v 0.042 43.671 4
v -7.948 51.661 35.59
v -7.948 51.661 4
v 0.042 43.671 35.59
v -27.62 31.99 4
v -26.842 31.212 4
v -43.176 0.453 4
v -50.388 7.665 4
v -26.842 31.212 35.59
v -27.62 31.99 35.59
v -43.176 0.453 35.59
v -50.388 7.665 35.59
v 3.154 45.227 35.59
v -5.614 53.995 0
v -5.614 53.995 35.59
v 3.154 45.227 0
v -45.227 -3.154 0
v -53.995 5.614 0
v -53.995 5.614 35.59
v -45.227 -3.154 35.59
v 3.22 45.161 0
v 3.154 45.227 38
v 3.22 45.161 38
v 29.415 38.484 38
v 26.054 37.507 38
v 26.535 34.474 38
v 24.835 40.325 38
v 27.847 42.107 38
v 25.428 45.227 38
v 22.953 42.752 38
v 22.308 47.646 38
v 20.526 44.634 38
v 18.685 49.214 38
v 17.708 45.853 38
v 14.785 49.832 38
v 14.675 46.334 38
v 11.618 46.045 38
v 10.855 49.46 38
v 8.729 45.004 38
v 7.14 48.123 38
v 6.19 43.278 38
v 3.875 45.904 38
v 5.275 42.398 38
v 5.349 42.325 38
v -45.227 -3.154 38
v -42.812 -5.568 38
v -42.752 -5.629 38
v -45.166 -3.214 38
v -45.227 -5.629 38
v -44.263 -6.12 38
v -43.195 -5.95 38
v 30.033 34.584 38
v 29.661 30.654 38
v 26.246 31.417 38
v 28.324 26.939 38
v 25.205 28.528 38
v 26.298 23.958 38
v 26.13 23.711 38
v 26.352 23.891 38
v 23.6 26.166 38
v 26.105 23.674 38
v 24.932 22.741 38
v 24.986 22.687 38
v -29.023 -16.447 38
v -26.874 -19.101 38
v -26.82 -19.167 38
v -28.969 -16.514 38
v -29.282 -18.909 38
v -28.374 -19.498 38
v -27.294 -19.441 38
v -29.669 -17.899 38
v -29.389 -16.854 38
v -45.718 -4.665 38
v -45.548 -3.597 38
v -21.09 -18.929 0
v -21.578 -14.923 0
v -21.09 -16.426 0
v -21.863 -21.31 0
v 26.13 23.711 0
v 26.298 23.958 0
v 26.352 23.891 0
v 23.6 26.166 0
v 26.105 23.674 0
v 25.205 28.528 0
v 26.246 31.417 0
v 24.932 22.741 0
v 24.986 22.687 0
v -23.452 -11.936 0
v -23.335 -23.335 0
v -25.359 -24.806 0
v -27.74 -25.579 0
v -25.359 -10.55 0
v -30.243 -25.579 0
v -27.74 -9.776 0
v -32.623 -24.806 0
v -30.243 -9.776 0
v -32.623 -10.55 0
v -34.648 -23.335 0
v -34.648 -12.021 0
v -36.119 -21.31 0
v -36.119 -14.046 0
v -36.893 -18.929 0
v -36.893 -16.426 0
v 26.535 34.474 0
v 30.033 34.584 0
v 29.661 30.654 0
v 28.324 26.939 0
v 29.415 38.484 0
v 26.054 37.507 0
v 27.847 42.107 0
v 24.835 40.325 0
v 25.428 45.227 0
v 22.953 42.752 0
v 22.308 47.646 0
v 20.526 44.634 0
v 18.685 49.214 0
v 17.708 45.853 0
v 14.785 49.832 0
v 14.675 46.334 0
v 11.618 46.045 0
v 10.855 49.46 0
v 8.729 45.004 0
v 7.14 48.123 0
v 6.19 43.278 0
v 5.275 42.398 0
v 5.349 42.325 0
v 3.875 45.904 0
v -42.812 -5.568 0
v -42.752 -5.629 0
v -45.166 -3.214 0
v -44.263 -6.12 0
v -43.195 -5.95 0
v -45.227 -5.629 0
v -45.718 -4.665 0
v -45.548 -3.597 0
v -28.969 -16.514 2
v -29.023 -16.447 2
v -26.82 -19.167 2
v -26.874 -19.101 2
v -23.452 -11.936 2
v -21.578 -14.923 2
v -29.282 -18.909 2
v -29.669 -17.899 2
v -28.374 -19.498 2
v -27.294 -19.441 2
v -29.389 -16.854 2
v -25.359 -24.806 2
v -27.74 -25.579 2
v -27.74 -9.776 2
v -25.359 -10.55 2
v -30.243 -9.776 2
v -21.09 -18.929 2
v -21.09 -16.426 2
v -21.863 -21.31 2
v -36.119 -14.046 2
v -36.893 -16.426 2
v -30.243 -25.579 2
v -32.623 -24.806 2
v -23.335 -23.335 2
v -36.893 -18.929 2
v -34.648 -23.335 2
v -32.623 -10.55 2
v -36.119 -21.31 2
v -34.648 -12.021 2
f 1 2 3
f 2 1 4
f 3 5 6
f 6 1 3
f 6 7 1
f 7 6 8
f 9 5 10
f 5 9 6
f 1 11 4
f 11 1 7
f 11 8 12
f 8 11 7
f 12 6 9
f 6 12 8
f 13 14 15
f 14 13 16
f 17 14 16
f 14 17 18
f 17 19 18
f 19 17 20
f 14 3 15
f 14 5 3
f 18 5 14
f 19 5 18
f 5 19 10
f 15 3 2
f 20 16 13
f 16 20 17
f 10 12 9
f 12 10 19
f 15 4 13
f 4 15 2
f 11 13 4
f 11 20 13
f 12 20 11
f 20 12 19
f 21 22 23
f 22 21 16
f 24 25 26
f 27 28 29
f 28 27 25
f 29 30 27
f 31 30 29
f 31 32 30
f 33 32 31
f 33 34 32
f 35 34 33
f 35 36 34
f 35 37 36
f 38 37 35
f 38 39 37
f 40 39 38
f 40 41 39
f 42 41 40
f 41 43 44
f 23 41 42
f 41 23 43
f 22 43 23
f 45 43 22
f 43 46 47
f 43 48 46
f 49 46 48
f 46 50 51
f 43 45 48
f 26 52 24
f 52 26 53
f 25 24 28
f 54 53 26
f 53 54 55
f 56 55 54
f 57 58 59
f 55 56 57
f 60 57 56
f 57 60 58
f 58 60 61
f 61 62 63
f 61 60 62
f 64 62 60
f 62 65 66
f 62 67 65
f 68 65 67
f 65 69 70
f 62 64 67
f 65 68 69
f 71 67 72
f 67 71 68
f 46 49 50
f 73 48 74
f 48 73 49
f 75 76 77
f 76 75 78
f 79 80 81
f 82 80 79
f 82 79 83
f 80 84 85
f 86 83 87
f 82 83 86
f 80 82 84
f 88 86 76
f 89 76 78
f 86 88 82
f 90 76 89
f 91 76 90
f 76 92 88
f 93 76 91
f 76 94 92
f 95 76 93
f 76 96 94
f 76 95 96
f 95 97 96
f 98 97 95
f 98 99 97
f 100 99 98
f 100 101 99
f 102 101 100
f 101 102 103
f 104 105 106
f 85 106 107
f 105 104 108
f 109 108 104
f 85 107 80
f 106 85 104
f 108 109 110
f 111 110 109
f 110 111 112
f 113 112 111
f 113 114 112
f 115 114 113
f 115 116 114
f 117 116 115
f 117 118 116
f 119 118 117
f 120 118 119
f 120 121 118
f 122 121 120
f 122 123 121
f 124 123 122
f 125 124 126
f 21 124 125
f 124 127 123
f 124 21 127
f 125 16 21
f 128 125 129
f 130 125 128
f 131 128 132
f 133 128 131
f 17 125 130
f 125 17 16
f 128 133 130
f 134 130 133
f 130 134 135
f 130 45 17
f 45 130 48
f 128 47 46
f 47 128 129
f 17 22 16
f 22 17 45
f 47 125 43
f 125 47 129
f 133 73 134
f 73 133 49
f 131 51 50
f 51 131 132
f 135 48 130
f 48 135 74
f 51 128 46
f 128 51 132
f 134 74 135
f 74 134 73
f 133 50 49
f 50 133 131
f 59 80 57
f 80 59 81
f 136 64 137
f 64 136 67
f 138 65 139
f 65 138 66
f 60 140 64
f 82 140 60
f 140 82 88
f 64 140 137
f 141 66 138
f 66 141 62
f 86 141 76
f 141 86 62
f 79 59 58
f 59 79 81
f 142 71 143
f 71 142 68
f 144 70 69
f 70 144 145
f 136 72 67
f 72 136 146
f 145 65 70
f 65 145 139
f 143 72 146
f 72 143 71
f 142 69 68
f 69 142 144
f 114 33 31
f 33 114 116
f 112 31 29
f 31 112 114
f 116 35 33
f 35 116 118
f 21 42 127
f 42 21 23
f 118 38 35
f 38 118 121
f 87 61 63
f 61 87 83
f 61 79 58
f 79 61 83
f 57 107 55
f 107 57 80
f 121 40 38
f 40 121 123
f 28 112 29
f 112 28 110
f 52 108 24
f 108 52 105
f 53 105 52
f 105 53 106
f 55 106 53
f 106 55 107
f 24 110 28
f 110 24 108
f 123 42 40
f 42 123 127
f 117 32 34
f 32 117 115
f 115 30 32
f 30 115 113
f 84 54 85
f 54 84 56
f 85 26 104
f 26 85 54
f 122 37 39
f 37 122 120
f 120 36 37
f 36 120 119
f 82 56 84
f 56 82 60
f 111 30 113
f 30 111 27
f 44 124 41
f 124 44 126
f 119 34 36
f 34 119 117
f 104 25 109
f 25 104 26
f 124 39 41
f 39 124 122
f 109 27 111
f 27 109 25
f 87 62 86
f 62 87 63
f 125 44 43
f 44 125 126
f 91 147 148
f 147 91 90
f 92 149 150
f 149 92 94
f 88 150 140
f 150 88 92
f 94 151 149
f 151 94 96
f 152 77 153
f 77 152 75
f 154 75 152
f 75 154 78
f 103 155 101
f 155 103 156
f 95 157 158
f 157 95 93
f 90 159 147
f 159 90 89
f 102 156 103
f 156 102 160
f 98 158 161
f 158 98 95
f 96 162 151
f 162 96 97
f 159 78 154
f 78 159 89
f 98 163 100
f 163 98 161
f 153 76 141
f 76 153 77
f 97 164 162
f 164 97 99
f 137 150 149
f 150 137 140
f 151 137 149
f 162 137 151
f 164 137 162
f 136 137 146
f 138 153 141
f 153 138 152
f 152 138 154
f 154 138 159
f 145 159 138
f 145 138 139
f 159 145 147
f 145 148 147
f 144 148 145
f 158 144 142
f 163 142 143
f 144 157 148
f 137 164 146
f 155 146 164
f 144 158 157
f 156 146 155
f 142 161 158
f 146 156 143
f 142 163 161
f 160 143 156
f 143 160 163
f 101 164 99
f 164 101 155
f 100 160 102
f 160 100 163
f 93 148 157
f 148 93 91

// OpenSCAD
// Copyright Reid Varner 2012
//
// Title: Garage Door Opener Clip
// 
// Purpose: My apartment gave me a keychain garage door opener. As this makes no sense because my garage door opener should
// never leave my car, I decided to create a clip for my opener that would fit on my car's sun visor.
//
// Enjoy.

/////////////////////
// Garage Door Fob //
/////////////////////

fobLenA = 60.42;
//fobLenB = 54.75; // not used
fobWidth = 31.60;
fobThickA = 9.90;
fobThickB = 10.20;
fobButtonLen = 27.82;
fobButtonThick = 12.4;
fobSlantLen = 9.43;

module fob() {
	union() {
		translate(v=[17,(fobButtonThick-fobThickB)/2,fobWidth/2]) 
			cube([fobButtonLen,fobButtonThick,fobWidth],center=true);
		translate(v=[0,0,fobWidth/2]) 
			cube([fobLenA,fobThickB,fobWidth],center=true);
	}
}

////////////////////////
// Container (fobBox) //
////////////////////////
fobBoxWallThickness = 4; //mm
fobBoxRetainerThickness = fobButtonThick - fobThickB; //mm
fobBoxBlankLen = fobLenA + (2 * fobBoxWallThickness);
fobBoxThickness = fobThickB + fobBoxRetainerThickness;
module fobBoxBlank() {
	translate(v=[0,0,(fobWidth + (2*fobBoxWallThickness))/2])
	cube([fobBoxBlankLen, fobBoxThickness, fobWidth + (2*fobBoxWallThickness)],
		center=true);
}

module fobBox() {
	difference() {
		fobBoxBlank();
		translate(v=[0,0,fobBoxWallThickness]) fob();
		translate(v=[0,0,2.5 + fobWidth + (fobBoxWallThickness) -0.01]) cube([200,200,5],center=true);
	}
}

//translate(v=[44,20,0]) rotate(a=[0,0,3.5])
module fobBoxThick() {
	union() {
	fobBox();
	translate(v=[0,-9.2,0])
	difference() {
		scale(v=[1,.5,1]) fobBoxBlank();
			translate(v=[0,0,2.5 + fobWidth + (fobBoxWallThickness) -0.01]) cube([200,200,5],center=true);
	}}
}


//////////
// Clip //
//////////
visorThick = 24.5;
clipWallThick = 3.5;
clipLen = fobBoxBlankLen;
clipHeight = 38;
clipAngle = 6;
clipFn = 25;
clipRadius = (visorThick/2) + clipWallThick;
clipInnerRadius = clipRadius - clipWallThick;
clipCurveTrim = .5;
module clipSide() {
	translate(v=[0,0,clipHeight/2])
	union() {
		cube([clipLen,clipWallThick,clipHeight],center=true);
		translate(v=[-clipLen/2,0,0]) cylinder(r=clipWallThick/2,h=clipHeight,center=true,$fn=10);
	}
}


module clipCurve() {
	translate(v=[clipLen/2,clipRadius-(clipWallThick/2),clipHeight/2])
	difference() {
		// Outer cylinder
		cylinder(h=clipHeight,r=clipRadius,center=true,$fn=clipFn);

		// Inner cylinder
		cylinder(h=clipHeight,r=clipInnerRadius,center=true,$fn=clipFn);

		translate(v=[-(clipRadius+5)/2 - clipCurveTrim,0,0])cube([clipRadius+5,2.2 * clipRadius,clipHeight + 2],center=true);
	}
}

module clip() {
	
	// Box with clip side
	translate(v=[0,clipWallThick + visorThick,0])
	union() {
		translate(v=[0,fobBoxThickness/2 + clipWallThick/2,0])fobBox();
		clipSide();
	}

	translate(v=[clipLen/2 + 1.5,0,0])rotate(a=[0,0,-clipAngle])translate(v=[-clipLen/2,0,0])clipSide();
}

/////////////////////////////
// Garage Door Opener Clip //
/////////////////////////////

module garageDoorOpenerClip() {	
	rotate(a=[0,0,45]) union() {
		clip();
		clipCurve();
		translate(v=[-33,8,1])cylinder(h=2,r=8,center=true,$fn=20);
	}
}


///////////////
// Execution //
///////////////

garageDoorOpenerClip();
